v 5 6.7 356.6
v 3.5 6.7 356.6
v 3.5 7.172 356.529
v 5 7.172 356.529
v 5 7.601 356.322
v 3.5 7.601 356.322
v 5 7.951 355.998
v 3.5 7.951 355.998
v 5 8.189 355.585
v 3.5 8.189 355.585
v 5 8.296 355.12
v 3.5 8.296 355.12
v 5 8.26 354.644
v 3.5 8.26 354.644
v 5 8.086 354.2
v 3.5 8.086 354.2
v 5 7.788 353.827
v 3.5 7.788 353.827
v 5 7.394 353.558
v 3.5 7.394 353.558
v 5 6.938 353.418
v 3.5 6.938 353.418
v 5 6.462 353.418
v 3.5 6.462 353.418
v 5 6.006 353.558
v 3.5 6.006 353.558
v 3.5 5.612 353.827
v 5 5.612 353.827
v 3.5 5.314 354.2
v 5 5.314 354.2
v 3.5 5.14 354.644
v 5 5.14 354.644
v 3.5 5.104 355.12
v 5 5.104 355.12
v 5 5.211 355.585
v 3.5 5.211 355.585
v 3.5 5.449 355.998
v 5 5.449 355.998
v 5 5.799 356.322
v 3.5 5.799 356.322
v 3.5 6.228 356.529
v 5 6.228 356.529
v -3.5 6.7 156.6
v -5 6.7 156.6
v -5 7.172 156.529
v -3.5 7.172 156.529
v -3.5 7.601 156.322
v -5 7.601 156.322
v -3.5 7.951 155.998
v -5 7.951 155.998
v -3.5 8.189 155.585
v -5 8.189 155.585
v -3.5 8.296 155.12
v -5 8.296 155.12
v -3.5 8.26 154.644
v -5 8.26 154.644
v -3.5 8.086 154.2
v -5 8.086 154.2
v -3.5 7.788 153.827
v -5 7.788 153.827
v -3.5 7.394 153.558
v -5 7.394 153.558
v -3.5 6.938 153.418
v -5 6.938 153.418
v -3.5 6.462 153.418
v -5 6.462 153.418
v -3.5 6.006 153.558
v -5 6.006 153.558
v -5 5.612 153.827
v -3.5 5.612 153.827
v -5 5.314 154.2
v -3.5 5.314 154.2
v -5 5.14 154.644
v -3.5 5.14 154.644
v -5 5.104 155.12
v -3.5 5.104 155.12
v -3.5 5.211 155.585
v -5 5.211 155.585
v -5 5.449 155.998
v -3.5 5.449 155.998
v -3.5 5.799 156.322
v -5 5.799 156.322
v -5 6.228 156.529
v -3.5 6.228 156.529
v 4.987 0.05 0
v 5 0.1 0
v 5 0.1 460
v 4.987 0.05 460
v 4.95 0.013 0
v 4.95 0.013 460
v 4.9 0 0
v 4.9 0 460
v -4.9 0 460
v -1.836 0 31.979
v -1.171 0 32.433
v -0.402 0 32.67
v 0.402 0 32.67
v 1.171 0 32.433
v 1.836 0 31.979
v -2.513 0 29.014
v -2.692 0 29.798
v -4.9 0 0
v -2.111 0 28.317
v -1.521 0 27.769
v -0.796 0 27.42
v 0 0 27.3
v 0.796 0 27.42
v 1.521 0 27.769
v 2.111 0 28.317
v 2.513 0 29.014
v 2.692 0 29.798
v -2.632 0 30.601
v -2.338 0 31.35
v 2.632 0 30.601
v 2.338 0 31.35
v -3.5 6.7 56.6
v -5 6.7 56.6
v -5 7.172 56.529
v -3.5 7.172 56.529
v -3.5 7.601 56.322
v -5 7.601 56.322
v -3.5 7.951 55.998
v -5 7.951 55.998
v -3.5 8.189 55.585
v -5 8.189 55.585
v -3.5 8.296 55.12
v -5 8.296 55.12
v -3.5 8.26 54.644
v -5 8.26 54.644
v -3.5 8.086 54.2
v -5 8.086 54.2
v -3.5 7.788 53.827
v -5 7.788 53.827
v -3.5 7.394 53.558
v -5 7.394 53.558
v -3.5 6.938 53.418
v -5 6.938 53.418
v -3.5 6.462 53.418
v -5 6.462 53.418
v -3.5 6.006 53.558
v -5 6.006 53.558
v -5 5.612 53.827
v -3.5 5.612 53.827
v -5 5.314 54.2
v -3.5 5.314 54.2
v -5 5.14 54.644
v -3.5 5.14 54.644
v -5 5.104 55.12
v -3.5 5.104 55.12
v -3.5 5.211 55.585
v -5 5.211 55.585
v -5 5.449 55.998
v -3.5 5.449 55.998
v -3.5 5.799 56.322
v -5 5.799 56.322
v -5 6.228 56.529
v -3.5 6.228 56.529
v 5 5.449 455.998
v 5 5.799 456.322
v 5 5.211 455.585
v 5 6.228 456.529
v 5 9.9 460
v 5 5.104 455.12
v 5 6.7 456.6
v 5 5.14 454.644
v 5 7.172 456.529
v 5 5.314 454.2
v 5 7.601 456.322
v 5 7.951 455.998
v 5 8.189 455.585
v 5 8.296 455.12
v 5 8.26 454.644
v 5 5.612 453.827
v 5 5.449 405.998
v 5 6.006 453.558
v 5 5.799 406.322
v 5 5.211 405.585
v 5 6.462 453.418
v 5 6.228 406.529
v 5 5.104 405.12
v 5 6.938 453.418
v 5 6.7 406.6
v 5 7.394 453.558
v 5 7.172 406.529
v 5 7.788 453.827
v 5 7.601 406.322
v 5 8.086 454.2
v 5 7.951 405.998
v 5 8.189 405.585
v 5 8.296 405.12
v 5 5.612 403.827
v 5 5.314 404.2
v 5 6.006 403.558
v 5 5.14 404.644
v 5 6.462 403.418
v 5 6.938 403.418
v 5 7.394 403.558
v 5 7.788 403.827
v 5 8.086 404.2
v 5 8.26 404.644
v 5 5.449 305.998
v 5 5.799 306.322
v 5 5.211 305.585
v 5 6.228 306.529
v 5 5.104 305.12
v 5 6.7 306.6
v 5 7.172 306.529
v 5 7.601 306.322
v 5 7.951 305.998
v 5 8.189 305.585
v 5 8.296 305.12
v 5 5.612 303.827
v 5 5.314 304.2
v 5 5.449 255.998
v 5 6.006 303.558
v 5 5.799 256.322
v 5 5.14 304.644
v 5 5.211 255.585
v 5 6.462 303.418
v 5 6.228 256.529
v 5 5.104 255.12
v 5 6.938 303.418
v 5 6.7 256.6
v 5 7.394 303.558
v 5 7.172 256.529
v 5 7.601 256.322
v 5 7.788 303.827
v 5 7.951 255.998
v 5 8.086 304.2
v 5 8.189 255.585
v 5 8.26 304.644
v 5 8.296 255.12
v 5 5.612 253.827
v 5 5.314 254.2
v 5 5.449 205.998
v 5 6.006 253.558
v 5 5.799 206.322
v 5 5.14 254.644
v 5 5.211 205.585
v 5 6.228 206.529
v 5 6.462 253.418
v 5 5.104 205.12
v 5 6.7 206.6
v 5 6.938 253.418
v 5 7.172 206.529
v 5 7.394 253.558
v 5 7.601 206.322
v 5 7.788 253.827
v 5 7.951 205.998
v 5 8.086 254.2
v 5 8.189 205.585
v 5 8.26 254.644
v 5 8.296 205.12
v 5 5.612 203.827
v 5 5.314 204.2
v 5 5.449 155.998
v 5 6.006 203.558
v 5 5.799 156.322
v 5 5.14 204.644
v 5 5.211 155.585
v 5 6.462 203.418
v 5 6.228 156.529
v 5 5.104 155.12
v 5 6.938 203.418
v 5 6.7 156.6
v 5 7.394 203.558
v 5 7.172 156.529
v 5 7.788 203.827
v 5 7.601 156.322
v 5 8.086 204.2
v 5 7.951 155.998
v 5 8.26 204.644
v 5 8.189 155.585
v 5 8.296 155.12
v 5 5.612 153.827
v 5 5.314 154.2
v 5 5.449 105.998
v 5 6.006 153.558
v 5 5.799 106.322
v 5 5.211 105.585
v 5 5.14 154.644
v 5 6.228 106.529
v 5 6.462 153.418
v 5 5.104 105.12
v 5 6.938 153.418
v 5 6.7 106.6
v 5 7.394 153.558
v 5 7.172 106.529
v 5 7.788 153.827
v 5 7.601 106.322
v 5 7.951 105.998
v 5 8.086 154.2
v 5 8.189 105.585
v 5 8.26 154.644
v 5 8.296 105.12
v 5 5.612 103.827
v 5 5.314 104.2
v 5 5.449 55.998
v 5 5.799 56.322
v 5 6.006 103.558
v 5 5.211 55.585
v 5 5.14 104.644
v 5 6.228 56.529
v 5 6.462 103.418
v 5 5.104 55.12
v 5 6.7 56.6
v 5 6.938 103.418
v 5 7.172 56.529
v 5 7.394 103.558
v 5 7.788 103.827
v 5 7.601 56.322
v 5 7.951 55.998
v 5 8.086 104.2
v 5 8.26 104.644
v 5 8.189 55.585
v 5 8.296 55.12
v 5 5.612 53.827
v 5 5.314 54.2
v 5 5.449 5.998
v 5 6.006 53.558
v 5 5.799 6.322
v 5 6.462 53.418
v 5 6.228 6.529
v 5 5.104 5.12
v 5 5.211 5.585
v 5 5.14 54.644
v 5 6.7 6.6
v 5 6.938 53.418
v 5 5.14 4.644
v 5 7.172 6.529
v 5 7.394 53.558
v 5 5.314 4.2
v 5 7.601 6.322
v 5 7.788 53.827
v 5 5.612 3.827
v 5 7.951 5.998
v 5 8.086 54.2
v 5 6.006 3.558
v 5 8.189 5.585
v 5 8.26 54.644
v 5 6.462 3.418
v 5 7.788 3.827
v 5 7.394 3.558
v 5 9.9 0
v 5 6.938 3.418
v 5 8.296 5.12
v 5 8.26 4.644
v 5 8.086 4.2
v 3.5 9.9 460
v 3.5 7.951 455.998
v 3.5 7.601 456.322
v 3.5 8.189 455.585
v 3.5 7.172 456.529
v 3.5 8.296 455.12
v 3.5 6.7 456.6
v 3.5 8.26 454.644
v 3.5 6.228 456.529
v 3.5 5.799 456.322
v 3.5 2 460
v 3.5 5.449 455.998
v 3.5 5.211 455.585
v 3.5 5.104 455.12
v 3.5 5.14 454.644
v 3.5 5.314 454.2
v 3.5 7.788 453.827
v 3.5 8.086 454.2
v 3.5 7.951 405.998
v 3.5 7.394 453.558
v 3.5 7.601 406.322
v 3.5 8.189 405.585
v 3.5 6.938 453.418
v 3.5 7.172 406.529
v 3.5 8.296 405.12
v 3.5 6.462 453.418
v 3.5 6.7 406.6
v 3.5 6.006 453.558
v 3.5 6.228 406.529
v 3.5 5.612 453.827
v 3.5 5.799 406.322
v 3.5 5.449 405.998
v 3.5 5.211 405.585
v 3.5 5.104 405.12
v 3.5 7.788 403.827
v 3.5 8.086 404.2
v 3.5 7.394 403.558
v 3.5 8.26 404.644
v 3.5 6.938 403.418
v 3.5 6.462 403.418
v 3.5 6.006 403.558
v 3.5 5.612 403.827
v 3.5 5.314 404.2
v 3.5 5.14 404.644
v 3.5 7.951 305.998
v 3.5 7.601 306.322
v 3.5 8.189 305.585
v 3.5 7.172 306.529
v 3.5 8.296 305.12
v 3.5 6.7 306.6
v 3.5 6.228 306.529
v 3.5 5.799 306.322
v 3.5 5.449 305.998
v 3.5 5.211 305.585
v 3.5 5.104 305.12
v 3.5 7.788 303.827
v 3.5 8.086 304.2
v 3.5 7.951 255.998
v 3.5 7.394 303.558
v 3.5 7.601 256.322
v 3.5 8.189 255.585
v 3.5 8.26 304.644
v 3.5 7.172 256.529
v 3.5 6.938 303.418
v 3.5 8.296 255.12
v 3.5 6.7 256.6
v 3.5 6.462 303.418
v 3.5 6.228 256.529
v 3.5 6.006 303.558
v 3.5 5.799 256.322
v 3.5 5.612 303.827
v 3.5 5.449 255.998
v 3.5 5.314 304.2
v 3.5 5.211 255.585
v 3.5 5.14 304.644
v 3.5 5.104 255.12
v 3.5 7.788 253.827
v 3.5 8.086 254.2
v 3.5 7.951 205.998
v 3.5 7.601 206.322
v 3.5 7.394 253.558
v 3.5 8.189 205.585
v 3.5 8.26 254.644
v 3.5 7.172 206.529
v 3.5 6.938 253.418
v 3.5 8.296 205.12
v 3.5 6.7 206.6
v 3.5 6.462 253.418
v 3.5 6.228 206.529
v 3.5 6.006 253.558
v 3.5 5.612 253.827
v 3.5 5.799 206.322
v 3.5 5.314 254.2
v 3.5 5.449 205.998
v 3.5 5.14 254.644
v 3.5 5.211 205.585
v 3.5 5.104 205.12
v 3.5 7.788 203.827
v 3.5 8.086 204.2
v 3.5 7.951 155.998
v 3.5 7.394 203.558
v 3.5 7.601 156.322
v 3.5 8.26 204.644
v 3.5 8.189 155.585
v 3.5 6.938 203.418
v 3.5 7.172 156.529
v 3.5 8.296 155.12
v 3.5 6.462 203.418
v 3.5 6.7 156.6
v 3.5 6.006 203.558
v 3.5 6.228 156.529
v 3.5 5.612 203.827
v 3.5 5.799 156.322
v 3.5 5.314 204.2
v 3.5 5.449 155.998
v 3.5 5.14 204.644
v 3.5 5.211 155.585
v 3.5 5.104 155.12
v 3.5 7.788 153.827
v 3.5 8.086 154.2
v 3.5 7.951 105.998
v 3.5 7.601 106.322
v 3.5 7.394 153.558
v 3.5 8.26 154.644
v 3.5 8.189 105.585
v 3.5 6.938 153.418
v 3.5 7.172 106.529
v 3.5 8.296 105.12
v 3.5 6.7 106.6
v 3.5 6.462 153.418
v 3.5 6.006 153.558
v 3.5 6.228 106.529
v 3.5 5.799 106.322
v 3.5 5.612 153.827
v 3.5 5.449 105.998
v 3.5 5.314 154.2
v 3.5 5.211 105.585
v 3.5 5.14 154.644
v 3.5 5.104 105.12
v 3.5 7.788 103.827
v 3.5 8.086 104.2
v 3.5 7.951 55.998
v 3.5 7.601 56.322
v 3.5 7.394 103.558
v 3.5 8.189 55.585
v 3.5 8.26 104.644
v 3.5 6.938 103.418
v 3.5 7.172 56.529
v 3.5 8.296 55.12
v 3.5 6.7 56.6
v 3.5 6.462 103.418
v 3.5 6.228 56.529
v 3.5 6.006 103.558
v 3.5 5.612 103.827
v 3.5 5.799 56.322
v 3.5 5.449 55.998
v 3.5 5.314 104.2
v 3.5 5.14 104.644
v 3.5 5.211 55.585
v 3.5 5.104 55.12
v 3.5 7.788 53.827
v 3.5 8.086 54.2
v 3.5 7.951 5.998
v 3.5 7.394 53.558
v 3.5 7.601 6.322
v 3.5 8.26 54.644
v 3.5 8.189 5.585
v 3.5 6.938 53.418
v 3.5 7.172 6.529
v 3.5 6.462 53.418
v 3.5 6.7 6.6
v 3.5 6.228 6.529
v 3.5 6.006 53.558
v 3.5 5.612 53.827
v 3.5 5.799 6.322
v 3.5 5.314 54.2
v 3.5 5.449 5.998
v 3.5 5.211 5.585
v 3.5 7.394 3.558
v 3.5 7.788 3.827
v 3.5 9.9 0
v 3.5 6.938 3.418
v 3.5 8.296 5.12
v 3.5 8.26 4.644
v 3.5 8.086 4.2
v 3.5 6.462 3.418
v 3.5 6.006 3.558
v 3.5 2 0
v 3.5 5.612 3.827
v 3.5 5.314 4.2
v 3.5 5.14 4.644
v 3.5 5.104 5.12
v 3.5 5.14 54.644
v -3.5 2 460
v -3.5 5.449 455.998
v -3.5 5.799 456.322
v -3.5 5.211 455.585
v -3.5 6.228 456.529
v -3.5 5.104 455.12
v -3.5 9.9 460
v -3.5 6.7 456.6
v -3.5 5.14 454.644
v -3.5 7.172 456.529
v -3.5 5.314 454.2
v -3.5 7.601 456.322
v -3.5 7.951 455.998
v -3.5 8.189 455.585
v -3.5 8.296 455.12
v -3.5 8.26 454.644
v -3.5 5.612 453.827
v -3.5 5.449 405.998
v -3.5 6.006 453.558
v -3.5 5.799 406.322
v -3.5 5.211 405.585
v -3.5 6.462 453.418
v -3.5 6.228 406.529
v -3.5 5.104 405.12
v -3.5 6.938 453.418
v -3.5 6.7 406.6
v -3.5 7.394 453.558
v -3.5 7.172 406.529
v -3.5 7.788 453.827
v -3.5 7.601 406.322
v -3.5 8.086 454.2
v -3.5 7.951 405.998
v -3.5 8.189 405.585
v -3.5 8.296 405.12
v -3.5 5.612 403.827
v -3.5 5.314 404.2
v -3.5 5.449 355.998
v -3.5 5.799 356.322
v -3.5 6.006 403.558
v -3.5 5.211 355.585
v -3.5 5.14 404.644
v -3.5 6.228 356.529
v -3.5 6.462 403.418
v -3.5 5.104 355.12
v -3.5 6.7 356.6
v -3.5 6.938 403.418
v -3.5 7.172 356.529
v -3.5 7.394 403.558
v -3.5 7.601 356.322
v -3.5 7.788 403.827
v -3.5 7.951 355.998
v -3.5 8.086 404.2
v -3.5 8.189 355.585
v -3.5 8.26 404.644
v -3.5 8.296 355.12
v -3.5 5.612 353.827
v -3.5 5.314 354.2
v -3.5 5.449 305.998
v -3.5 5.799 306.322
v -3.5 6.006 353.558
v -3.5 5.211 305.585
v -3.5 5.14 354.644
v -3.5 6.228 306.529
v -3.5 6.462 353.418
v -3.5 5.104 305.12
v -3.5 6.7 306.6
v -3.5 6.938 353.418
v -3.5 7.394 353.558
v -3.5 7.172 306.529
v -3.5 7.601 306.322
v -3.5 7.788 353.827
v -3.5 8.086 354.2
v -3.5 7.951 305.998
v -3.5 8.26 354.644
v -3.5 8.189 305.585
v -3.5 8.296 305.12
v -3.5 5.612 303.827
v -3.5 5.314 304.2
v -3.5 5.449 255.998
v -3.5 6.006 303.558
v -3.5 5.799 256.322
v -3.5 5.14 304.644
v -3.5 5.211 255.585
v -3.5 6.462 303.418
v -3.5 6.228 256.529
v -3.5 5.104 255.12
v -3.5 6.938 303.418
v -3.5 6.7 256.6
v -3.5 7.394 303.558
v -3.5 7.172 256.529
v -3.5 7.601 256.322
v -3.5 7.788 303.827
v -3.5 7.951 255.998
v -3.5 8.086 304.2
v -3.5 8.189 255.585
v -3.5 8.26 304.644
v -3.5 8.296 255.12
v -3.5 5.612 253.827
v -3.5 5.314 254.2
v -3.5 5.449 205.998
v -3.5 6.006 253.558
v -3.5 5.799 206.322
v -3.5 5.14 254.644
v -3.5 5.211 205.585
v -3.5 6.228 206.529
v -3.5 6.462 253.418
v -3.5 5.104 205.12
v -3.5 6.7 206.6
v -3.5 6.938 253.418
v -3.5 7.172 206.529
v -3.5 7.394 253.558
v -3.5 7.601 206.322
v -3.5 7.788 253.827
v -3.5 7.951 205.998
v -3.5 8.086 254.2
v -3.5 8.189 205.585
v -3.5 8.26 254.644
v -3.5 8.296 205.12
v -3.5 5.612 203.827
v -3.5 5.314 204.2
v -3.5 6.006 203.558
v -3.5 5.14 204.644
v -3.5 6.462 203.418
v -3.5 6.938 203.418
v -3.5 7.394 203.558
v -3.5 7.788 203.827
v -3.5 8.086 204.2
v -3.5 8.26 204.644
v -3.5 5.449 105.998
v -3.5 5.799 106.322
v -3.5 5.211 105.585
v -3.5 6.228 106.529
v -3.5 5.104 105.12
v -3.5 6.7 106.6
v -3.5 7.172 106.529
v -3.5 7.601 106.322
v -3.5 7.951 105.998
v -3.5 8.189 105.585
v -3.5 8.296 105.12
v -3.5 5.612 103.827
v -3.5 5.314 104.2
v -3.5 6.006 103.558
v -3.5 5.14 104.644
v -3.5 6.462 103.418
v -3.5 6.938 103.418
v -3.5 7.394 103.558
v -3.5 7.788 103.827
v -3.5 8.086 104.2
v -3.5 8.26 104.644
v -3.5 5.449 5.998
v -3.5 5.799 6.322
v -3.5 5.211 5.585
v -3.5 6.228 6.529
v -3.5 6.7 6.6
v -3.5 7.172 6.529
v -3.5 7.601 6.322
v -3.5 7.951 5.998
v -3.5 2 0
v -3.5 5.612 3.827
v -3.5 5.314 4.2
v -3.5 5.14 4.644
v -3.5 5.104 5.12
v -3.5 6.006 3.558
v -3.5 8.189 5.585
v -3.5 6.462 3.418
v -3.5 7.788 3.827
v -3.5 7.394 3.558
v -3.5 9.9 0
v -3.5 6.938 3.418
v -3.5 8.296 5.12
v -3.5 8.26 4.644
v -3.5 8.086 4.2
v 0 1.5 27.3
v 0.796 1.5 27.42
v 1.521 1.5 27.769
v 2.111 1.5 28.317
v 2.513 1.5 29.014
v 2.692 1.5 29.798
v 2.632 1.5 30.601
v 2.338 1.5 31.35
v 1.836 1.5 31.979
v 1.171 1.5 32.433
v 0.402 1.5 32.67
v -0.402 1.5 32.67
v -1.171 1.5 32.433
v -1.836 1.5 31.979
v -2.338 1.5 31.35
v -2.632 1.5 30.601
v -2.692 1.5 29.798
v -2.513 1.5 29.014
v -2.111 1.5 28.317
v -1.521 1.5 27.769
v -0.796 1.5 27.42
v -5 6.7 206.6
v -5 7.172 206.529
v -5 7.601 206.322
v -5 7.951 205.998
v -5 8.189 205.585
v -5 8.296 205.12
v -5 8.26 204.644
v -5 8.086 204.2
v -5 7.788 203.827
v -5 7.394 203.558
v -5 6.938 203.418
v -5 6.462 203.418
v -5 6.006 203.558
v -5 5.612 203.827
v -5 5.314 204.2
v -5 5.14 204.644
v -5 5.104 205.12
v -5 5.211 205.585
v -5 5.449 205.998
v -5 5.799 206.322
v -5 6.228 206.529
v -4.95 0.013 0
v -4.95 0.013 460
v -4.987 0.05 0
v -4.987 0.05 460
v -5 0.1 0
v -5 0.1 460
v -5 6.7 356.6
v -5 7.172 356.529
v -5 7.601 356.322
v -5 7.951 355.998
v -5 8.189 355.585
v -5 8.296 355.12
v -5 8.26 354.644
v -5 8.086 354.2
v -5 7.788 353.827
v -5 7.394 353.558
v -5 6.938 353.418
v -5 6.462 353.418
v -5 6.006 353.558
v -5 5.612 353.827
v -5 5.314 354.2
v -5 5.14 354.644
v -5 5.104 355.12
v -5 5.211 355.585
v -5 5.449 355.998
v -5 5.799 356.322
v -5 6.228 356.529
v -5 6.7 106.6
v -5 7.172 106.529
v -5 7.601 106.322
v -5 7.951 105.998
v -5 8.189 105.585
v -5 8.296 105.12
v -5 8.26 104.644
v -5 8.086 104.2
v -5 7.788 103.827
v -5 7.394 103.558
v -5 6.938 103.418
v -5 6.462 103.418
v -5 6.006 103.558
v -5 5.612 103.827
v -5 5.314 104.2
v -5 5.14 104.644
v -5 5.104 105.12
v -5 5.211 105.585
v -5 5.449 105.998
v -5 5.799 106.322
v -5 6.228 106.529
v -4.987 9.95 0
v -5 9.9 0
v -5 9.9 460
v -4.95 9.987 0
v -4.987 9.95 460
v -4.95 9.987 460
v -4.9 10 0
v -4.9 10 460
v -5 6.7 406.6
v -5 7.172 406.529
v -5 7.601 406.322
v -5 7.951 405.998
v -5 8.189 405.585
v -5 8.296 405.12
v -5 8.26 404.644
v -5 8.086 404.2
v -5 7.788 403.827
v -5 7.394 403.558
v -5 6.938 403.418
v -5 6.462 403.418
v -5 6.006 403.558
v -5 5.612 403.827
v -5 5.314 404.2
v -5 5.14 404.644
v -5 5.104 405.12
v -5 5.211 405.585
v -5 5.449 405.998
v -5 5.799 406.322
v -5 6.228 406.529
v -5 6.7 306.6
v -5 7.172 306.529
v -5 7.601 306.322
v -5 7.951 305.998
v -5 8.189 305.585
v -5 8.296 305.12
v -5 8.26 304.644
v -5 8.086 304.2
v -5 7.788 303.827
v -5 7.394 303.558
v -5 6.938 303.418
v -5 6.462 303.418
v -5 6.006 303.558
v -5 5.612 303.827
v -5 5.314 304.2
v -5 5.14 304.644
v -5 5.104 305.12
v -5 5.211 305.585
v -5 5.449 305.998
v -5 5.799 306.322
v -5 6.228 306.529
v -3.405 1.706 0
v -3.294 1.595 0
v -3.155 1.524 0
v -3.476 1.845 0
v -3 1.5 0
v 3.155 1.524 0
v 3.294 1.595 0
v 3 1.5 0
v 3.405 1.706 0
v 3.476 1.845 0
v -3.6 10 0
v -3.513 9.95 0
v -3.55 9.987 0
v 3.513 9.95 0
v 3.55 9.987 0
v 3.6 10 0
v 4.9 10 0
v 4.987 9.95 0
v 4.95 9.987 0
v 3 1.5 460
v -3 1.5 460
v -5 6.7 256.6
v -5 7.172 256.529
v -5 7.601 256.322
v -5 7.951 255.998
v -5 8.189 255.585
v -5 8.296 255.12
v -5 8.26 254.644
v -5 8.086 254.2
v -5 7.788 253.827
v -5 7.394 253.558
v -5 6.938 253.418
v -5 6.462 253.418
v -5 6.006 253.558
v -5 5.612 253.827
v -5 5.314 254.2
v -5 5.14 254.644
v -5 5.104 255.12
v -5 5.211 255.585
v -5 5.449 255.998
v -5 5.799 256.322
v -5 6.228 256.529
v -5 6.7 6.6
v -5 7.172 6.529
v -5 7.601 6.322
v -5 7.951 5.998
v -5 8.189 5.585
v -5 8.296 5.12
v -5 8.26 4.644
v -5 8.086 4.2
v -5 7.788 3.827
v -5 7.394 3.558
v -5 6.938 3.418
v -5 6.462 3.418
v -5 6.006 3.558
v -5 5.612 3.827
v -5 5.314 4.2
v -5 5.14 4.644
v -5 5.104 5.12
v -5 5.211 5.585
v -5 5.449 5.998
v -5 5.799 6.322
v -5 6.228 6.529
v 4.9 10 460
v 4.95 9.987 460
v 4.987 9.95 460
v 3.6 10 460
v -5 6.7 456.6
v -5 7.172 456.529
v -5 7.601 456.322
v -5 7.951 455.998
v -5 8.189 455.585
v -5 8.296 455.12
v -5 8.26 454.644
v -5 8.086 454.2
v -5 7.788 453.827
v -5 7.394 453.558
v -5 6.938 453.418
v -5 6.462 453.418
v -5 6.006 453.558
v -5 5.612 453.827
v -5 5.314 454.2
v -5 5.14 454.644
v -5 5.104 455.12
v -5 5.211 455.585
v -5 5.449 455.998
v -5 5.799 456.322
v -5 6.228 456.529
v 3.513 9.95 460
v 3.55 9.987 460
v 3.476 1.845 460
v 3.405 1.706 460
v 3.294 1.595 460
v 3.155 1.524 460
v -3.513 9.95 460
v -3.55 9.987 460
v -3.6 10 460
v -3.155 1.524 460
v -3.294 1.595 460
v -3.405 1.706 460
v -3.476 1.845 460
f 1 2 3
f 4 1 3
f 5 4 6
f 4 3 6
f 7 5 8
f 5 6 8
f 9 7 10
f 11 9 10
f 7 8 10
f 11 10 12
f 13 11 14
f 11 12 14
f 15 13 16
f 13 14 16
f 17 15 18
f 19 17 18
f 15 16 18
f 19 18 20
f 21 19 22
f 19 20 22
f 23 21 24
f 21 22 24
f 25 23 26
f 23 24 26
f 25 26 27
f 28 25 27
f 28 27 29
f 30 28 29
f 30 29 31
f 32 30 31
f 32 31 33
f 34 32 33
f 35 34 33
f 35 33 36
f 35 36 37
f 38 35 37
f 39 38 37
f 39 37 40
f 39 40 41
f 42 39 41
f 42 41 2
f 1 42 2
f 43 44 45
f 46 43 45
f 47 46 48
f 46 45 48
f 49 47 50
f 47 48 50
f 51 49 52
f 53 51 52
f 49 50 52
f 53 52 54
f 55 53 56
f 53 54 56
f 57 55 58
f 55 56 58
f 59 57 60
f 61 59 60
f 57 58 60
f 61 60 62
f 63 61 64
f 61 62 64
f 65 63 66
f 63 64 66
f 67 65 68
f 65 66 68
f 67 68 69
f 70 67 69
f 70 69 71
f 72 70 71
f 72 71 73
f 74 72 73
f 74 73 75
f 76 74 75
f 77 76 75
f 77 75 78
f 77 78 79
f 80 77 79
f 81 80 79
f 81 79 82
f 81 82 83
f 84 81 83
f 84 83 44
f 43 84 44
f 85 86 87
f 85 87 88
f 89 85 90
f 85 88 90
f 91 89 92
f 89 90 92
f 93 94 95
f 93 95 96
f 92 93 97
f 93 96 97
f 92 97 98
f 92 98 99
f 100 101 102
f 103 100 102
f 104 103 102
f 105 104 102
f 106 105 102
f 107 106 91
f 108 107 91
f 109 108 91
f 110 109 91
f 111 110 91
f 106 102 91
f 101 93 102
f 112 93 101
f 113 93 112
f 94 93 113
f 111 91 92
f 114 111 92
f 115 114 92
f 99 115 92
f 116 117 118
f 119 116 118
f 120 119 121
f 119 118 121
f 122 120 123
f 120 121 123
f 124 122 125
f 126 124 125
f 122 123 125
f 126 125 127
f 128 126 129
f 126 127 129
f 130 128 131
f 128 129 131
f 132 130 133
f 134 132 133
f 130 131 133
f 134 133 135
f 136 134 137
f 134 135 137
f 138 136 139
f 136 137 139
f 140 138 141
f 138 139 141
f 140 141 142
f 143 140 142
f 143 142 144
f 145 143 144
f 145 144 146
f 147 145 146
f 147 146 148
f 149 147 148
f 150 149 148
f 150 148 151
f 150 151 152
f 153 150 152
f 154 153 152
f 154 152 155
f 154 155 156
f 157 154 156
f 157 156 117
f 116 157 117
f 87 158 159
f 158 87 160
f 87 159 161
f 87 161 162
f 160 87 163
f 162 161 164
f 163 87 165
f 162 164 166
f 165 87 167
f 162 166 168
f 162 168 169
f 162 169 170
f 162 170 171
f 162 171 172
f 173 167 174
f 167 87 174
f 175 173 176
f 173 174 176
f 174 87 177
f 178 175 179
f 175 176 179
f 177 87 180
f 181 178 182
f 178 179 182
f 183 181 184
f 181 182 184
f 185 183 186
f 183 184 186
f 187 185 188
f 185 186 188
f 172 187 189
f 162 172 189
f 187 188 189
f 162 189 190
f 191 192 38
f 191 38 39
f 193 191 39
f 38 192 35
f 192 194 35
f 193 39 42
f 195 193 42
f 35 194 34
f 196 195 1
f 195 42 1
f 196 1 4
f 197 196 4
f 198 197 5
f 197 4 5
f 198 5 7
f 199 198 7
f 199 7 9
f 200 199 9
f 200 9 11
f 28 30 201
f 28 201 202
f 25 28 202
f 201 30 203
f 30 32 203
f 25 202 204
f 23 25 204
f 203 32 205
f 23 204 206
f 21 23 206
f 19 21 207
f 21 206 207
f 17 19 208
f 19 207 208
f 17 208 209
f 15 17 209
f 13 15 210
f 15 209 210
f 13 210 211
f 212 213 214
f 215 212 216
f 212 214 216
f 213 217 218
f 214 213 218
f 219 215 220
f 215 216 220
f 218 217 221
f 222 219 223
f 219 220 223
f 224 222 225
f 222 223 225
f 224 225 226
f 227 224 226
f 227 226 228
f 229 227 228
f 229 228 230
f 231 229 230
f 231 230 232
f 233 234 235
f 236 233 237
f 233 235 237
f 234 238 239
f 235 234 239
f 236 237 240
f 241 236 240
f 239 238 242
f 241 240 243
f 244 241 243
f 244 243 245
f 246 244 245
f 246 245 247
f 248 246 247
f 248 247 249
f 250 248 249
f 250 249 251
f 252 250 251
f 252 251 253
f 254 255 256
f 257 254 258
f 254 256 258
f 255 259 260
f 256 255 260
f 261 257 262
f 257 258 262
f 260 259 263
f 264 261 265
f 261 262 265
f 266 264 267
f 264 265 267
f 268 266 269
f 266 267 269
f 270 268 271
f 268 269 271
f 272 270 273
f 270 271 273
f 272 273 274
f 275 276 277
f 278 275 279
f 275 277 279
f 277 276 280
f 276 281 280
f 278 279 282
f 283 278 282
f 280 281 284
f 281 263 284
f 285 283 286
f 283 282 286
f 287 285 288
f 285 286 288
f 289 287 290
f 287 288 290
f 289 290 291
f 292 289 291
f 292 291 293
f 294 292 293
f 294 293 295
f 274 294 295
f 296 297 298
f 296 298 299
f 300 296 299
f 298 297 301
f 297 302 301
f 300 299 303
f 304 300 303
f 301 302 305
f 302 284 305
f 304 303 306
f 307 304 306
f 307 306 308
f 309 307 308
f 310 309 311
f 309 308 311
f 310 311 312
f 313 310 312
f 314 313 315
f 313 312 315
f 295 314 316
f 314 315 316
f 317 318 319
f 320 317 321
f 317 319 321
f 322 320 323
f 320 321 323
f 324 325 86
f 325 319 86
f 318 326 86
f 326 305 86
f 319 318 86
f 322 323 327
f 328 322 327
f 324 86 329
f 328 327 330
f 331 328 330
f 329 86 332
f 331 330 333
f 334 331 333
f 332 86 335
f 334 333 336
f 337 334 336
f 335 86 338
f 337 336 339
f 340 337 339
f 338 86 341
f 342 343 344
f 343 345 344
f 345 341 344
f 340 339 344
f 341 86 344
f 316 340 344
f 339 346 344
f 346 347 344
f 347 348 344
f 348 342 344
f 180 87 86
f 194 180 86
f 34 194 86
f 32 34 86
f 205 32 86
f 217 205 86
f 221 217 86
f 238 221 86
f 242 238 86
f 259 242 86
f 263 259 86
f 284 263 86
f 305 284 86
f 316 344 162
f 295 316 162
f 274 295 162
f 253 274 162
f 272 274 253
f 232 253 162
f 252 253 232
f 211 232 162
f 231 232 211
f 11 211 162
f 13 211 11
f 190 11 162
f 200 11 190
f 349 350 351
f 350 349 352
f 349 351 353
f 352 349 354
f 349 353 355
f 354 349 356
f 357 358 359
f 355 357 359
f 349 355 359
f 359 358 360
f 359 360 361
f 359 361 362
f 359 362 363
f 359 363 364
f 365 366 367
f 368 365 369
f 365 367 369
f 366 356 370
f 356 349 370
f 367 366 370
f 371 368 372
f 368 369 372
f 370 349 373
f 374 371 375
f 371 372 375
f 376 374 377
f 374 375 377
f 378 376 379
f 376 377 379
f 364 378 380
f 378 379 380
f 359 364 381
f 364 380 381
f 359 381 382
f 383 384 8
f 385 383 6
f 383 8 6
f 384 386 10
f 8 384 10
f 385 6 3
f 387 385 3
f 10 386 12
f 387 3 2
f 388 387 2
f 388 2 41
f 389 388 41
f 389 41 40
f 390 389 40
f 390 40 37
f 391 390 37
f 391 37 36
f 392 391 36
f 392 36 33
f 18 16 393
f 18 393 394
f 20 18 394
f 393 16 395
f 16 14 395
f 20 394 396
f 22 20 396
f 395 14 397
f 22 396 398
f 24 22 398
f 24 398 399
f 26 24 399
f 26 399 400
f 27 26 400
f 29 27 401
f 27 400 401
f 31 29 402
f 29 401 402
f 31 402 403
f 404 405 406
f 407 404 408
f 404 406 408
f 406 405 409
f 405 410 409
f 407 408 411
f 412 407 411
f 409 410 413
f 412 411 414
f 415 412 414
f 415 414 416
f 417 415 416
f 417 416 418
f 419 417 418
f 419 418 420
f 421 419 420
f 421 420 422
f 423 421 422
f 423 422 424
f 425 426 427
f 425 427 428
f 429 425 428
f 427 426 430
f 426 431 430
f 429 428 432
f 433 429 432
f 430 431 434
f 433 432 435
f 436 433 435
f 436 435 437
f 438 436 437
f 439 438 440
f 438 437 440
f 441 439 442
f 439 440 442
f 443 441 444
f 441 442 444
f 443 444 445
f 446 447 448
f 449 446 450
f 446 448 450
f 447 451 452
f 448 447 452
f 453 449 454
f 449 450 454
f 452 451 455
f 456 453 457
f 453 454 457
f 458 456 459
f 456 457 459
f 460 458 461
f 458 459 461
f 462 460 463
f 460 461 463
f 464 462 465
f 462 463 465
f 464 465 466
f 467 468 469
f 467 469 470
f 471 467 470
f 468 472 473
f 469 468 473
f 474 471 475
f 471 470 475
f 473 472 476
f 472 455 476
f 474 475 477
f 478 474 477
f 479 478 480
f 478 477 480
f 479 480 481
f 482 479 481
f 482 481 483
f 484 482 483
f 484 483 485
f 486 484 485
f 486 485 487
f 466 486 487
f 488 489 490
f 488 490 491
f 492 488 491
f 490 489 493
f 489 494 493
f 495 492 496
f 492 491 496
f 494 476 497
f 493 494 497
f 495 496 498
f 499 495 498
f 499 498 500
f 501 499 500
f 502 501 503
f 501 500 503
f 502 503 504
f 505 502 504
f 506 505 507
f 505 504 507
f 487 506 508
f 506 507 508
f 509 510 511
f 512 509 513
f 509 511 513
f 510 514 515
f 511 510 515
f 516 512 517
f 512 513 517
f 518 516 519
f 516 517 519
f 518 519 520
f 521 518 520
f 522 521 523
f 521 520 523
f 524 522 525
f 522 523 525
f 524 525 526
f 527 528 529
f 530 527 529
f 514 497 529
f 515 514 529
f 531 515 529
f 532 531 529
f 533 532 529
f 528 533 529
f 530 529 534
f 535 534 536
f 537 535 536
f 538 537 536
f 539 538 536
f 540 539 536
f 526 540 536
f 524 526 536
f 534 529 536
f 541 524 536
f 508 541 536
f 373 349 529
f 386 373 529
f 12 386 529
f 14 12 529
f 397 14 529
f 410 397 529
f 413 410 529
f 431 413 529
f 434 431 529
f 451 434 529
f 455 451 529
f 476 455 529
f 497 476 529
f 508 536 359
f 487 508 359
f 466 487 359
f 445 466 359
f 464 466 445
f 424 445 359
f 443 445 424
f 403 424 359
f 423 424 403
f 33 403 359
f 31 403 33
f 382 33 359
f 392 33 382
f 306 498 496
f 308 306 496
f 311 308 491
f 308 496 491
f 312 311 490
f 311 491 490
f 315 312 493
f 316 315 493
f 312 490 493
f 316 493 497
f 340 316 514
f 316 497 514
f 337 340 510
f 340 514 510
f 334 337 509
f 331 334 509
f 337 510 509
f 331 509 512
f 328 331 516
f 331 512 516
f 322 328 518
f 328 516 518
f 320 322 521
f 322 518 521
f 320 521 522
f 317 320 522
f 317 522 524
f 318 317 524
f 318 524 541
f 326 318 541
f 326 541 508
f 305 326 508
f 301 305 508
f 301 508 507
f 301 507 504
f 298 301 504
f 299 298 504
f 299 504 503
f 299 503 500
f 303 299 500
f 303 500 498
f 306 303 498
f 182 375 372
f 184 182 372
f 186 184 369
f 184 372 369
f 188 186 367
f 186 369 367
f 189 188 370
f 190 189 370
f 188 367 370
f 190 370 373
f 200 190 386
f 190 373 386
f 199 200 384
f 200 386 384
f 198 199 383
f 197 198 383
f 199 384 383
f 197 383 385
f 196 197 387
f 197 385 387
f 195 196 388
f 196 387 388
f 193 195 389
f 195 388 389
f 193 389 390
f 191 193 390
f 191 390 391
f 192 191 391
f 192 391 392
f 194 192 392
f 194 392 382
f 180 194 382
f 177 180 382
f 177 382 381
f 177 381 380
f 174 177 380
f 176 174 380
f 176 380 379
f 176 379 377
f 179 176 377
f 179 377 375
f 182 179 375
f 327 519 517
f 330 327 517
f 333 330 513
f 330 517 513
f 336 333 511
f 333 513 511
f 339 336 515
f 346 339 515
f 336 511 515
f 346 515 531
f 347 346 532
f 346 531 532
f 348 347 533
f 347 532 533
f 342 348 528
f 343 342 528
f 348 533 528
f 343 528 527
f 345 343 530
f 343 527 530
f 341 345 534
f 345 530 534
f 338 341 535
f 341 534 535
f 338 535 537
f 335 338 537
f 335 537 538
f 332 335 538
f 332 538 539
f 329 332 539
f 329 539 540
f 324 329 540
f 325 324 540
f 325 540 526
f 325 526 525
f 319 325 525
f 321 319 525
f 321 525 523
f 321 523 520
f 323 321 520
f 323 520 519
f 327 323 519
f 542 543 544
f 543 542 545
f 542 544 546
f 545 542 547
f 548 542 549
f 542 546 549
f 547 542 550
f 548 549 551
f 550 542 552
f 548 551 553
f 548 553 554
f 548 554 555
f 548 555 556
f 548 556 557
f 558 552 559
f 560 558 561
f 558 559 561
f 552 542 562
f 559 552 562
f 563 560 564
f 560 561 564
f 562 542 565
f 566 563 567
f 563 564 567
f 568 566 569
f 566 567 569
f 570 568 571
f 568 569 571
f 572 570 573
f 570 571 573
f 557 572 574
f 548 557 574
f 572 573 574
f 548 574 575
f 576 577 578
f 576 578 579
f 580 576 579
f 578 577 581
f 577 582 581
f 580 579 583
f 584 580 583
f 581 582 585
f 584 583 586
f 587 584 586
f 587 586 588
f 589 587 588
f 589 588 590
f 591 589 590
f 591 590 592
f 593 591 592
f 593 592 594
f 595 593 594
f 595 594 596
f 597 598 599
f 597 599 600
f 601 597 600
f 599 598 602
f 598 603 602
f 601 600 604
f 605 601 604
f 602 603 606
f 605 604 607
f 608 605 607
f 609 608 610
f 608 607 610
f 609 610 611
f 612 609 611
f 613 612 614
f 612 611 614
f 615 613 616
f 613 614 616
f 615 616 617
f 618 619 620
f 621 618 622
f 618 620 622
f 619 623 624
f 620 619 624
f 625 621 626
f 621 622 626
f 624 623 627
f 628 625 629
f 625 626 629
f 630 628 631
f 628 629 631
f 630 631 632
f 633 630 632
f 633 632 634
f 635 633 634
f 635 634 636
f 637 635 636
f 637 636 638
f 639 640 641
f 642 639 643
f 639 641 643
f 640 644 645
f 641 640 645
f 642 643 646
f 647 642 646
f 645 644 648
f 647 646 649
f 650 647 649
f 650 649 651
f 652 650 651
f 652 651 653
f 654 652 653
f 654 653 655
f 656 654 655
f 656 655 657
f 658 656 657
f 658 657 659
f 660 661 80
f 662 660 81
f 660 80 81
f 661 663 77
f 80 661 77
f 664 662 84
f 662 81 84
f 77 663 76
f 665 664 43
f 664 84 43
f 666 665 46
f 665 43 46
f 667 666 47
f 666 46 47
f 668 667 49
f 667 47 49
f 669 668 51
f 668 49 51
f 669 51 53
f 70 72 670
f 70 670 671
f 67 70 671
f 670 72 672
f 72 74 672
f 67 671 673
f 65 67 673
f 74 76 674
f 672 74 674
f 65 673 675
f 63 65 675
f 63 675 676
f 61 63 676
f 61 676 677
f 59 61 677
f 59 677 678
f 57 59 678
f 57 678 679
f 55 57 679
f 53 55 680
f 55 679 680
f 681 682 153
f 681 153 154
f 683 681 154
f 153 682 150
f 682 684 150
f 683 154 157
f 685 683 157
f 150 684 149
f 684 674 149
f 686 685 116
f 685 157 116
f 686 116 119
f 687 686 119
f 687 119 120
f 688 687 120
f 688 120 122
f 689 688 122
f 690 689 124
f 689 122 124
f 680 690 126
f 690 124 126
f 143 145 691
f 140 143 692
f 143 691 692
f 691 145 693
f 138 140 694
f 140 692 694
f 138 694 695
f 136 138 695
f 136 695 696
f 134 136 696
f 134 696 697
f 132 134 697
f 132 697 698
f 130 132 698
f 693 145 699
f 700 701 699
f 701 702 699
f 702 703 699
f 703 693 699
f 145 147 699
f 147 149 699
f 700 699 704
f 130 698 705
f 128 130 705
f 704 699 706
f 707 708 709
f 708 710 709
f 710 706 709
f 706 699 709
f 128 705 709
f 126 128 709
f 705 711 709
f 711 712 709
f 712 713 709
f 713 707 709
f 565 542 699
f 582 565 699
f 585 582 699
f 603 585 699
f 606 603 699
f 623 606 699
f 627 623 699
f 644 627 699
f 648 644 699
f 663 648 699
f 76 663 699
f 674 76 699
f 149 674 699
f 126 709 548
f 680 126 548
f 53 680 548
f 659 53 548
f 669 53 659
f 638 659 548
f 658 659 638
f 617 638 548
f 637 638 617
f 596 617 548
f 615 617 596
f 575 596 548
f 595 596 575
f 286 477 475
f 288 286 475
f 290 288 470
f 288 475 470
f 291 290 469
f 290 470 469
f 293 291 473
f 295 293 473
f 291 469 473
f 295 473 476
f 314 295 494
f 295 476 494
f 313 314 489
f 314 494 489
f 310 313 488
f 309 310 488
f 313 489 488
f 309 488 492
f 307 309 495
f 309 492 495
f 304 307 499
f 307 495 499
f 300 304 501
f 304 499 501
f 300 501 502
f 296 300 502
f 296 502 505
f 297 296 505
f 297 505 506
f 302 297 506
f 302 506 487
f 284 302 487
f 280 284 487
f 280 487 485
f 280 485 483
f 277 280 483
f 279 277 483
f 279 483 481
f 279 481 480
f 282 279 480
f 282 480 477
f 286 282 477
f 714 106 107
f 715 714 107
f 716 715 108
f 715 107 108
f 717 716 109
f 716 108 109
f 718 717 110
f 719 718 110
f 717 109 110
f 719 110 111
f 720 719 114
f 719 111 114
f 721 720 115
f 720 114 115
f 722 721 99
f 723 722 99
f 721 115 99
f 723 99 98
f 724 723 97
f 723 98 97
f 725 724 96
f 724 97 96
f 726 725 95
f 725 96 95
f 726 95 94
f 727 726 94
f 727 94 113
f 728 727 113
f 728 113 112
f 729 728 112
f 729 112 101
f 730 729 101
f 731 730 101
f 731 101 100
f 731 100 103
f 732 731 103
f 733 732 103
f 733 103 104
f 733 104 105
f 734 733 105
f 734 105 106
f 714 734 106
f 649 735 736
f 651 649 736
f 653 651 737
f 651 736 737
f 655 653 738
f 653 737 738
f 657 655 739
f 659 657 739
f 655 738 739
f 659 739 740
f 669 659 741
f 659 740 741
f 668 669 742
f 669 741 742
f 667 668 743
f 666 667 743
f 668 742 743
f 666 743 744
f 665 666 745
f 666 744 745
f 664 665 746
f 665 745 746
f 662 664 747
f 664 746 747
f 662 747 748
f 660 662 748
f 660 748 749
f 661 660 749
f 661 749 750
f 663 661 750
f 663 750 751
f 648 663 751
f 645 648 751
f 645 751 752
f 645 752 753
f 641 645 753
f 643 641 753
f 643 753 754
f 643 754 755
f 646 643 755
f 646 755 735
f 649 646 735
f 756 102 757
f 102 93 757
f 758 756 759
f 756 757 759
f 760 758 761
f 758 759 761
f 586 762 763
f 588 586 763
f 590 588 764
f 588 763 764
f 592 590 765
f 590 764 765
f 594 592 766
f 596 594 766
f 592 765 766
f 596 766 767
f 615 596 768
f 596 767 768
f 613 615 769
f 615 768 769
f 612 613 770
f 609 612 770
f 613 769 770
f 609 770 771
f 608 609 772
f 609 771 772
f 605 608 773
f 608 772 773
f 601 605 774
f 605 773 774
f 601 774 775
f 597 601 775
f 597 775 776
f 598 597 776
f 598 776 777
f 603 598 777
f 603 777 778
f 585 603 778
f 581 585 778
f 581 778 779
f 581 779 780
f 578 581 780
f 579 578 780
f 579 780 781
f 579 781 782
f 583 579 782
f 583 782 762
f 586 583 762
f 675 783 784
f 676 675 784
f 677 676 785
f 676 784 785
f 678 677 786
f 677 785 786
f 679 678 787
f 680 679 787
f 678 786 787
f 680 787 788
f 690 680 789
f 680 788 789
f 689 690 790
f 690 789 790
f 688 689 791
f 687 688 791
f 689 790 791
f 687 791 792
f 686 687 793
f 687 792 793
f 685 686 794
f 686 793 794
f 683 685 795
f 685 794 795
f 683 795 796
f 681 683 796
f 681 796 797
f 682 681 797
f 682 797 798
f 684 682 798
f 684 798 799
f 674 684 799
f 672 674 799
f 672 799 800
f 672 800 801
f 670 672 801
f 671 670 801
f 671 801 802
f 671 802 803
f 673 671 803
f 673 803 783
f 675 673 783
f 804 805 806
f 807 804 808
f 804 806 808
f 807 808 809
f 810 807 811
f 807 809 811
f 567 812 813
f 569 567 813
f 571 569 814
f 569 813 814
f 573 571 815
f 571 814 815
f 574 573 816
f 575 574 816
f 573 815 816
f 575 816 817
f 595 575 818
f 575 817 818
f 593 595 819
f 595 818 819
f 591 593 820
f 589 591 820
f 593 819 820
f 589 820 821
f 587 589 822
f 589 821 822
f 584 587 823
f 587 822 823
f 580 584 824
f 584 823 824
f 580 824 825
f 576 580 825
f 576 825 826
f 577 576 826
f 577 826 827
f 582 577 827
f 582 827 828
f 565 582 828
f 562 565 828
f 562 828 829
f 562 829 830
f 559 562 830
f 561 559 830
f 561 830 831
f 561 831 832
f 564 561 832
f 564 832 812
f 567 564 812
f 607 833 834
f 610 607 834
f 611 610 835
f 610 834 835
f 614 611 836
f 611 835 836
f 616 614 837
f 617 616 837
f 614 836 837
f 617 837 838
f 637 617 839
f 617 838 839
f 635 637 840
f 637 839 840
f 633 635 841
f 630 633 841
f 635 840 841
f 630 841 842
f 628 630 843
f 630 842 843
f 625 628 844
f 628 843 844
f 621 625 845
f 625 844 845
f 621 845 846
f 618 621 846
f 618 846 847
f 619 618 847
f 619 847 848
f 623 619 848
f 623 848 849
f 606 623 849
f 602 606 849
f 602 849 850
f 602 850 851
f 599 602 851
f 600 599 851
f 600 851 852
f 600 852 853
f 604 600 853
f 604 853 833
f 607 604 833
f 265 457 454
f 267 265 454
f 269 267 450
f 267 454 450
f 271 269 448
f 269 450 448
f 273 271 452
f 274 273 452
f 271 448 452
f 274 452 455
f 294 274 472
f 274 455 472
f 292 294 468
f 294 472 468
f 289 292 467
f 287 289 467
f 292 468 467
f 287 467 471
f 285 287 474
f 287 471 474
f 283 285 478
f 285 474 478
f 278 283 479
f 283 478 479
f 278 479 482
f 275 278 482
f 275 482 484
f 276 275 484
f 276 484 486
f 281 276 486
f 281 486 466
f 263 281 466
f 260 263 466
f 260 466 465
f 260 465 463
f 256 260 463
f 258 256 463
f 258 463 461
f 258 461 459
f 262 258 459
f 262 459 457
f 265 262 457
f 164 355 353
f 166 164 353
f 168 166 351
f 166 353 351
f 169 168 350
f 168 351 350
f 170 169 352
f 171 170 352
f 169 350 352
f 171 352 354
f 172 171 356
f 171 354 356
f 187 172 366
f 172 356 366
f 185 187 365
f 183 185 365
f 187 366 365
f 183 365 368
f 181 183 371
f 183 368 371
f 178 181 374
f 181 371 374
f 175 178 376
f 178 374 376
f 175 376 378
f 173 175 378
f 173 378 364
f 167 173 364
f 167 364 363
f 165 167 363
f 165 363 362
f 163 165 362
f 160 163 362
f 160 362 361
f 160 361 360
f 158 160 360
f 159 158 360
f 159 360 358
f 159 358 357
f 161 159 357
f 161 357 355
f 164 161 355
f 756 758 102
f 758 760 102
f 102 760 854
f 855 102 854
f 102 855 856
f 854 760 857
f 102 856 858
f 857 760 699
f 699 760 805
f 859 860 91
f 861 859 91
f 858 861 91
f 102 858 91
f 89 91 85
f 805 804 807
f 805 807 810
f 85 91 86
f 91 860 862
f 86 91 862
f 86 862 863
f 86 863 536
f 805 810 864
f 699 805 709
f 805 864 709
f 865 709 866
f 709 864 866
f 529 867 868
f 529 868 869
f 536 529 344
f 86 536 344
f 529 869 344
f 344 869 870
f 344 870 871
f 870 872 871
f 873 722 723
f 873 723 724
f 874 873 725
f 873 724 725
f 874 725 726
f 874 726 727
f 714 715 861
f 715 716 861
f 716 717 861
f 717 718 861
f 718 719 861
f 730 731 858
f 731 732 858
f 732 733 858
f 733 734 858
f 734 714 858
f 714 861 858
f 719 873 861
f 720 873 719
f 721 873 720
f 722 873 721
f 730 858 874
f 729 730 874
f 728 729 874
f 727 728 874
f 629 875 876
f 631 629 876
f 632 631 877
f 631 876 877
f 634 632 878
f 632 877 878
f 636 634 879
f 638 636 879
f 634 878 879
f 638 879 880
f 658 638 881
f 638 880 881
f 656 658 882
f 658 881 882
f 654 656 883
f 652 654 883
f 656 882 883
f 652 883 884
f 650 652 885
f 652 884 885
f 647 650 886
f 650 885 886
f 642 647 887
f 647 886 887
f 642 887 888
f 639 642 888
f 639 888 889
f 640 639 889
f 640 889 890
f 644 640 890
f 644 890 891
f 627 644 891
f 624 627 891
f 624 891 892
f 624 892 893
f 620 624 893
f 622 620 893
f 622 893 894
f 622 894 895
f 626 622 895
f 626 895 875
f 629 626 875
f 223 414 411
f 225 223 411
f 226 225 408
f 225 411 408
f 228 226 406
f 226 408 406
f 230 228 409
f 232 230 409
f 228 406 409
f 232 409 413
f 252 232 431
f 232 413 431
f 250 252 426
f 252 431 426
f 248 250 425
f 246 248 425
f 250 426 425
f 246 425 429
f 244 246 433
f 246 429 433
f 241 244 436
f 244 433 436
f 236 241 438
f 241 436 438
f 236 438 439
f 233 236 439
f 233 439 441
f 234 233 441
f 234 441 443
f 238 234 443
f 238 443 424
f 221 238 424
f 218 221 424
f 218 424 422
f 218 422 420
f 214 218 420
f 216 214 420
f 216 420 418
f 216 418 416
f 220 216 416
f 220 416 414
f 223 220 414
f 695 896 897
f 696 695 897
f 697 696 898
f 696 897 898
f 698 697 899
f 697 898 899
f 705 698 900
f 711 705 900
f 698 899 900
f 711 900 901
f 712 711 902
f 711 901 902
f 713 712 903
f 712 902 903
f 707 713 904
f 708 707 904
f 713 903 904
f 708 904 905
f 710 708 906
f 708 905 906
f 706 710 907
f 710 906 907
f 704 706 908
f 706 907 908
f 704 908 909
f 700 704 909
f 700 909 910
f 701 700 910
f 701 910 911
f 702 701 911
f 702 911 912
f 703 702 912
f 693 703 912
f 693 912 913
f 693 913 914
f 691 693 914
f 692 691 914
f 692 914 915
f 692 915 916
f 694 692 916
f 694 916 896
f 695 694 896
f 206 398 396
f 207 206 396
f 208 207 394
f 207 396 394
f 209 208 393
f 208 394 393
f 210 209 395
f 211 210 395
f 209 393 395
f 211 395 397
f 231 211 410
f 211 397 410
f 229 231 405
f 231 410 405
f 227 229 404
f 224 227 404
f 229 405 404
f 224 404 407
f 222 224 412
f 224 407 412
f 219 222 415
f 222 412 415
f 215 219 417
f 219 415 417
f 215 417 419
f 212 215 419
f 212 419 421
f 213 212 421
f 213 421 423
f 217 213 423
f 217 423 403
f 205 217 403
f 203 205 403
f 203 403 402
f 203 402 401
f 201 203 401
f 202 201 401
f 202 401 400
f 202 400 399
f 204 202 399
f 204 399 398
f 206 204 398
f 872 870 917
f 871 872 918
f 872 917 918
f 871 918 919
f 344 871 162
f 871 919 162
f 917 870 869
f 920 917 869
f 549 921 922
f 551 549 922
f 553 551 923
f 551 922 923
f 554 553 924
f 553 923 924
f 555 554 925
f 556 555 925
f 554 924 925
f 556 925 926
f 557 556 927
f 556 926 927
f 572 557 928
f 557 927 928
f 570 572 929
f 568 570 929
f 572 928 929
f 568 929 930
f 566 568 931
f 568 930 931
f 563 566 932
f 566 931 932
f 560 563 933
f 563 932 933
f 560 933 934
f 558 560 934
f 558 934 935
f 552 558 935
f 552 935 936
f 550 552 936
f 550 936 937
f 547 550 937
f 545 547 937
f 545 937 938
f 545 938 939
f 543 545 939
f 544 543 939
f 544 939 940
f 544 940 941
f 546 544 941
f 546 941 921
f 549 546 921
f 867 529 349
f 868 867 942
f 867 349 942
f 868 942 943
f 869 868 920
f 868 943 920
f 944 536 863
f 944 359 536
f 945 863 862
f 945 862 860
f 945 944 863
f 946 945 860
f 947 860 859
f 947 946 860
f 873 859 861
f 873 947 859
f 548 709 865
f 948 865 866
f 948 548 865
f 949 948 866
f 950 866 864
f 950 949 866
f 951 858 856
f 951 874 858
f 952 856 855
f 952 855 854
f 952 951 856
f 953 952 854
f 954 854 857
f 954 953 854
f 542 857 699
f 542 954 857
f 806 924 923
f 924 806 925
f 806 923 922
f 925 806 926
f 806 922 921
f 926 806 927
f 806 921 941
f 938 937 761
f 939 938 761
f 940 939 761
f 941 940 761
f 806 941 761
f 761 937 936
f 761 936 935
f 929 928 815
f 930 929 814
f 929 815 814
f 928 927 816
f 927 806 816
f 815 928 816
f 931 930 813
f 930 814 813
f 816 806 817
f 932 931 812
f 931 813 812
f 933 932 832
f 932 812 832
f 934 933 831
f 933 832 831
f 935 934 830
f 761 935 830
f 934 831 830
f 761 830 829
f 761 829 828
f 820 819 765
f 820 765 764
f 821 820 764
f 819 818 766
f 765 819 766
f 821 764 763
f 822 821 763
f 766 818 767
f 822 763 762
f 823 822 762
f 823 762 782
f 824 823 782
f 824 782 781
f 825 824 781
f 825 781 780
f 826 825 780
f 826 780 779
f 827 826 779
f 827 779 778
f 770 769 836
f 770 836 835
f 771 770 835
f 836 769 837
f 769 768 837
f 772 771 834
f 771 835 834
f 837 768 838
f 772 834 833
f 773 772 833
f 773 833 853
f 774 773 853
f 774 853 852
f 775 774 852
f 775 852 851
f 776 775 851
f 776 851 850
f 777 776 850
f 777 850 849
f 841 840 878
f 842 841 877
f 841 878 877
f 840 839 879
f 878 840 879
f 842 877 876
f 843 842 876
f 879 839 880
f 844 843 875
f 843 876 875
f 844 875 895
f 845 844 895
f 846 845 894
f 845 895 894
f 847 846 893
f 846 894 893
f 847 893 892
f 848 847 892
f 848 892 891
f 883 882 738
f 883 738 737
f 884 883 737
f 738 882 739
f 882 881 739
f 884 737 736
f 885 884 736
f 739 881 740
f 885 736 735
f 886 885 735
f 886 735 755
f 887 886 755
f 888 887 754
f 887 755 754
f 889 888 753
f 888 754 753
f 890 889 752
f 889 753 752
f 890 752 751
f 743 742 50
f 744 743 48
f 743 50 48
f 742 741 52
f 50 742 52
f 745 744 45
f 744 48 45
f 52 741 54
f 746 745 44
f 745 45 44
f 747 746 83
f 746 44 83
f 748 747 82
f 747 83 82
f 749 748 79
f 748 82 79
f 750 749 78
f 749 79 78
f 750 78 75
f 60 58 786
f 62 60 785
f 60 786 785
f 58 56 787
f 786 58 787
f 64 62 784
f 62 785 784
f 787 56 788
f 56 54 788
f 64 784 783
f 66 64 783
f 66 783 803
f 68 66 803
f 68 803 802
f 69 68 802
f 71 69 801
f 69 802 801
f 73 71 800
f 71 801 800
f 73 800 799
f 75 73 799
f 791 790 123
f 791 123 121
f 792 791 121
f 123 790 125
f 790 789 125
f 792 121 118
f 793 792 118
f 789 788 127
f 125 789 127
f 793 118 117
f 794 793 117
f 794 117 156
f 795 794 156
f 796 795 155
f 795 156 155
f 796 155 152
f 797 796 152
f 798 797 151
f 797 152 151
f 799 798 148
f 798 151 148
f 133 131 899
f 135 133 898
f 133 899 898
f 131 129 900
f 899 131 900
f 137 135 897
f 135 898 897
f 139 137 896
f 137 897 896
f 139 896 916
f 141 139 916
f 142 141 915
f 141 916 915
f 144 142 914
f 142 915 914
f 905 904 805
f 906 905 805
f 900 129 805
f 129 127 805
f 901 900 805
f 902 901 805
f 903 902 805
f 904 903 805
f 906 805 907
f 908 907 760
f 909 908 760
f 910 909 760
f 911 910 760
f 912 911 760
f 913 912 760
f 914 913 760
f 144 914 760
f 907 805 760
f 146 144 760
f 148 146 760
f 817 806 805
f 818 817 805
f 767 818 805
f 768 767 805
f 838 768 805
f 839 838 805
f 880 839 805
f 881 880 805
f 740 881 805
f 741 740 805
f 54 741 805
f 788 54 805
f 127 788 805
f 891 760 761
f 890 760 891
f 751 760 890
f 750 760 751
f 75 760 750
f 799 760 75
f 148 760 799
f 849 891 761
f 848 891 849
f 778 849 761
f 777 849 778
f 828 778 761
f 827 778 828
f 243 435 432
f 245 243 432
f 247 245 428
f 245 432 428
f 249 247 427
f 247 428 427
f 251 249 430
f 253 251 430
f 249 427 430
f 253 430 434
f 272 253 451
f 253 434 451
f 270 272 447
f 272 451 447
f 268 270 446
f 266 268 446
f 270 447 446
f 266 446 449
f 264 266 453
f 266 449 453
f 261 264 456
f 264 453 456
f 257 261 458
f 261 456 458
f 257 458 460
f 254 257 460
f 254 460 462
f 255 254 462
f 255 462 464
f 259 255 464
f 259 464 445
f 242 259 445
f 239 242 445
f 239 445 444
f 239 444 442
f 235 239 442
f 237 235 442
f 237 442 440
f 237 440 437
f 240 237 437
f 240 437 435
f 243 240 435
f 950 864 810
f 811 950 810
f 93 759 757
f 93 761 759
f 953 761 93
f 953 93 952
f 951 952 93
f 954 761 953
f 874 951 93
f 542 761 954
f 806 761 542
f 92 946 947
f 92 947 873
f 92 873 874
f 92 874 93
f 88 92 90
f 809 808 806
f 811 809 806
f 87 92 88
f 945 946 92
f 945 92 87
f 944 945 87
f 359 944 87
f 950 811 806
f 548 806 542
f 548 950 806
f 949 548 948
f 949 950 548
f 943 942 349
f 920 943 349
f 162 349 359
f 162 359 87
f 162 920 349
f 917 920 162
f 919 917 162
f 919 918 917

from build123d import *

# Parameters (mm, degrees)
BOSS_EXTRUDE1_DEPTH = 460
FILLET1_R           = 0.5
FILLET2_R           = 0.1
SKETCH2_R           = 1.6
CUT_EXTRUDE1_DEPTH  = 461.21733996
SKETCH4_R           = 2.7
CUT_EXTRUDE2_DEPTH  = 461.135849505


with BuildPart() as part:
    # Sketch1 → Boss-Extrude1 (new body)
    with BuildSketch(Plane.XY):
        Polygon((-5, 0), (5, 0), (5, 10), (3.5, 10), (3.5, 1.5), (-3.5, 1.5), (-3.5, 10), (-5, 10), align=None)
    extrude(amount=BOSS_EXTRUDE1_DEPTH)

    # Fillet1
    fillet1_edges = [part.edges().sort_by_distance(p)[0] for p in [
        (-3.5, 1.5, 230),
        (3.5, 1.5, 230),
    ]]
    fillet(fillet1_edges, radius=FILLET1_R)

    # Fillet2
    fillet2_edges = [part.edges().sort_by_distance(p)[0] for p in [
        (5, 0, 230),
        (-5, 0, 230),
        (-5, 10, 230),
        (-3.5, 10, 230),
        (3.5, 10, 230),
        (5, 10, 230),
    ]]
    fillet(fillet2_edges, radius=FILLET2_R)

    # Sketch2 → Cut-Extrude1 (cut, through all)
    with BuildSketch(Plane.ZY.offset(5)):
        with Locations((5, 6.7)):
            Circle(SKETCH2_R)
        with Locations((55, 6.7)):
            Circle(SKETCH2_R)
        with Locations((105, 6.7)):
            Circle(SKETCH2_R)
        with Locations((155, 6.7)):
            Circle(SKETCH2_R)
        with Locations((205, 6.7)):
            Circle(SKETCH2_R)
        with Locations((255, 6.7)):
            Circle(SKETCH2_R)
        with Locations((305, 6.7)):
            Circle(SKETCH2_R)
        with Locations((355, 6.7)):
            Circle(SKETCH2_R)
        with Locations((405, 6.7)):
            Circle(SKETCH2_R)
        with Locations((455, 6.7)):
            Circle(SKETCH2_R)
        with Locations((505, 6.7)):
            Circle(SKETCH2_R)
    extrude(amount=-CUT_EXTRUDE1_DEPTH, mode=Mode.SUBTRACT)

    # Sketch4 → Cut-Extrude2 (cut, through all)
    with BuildSketch(Plane.XZ):
        with Locations(Location((0, 30, 0), (0, 0, 270))):
            Circle(SKETCH4_R)
    extrude(amount=-CUT_EXTRUDE2_DEPTH, mode=Mode.SUBTRACT)


solid = part.part
